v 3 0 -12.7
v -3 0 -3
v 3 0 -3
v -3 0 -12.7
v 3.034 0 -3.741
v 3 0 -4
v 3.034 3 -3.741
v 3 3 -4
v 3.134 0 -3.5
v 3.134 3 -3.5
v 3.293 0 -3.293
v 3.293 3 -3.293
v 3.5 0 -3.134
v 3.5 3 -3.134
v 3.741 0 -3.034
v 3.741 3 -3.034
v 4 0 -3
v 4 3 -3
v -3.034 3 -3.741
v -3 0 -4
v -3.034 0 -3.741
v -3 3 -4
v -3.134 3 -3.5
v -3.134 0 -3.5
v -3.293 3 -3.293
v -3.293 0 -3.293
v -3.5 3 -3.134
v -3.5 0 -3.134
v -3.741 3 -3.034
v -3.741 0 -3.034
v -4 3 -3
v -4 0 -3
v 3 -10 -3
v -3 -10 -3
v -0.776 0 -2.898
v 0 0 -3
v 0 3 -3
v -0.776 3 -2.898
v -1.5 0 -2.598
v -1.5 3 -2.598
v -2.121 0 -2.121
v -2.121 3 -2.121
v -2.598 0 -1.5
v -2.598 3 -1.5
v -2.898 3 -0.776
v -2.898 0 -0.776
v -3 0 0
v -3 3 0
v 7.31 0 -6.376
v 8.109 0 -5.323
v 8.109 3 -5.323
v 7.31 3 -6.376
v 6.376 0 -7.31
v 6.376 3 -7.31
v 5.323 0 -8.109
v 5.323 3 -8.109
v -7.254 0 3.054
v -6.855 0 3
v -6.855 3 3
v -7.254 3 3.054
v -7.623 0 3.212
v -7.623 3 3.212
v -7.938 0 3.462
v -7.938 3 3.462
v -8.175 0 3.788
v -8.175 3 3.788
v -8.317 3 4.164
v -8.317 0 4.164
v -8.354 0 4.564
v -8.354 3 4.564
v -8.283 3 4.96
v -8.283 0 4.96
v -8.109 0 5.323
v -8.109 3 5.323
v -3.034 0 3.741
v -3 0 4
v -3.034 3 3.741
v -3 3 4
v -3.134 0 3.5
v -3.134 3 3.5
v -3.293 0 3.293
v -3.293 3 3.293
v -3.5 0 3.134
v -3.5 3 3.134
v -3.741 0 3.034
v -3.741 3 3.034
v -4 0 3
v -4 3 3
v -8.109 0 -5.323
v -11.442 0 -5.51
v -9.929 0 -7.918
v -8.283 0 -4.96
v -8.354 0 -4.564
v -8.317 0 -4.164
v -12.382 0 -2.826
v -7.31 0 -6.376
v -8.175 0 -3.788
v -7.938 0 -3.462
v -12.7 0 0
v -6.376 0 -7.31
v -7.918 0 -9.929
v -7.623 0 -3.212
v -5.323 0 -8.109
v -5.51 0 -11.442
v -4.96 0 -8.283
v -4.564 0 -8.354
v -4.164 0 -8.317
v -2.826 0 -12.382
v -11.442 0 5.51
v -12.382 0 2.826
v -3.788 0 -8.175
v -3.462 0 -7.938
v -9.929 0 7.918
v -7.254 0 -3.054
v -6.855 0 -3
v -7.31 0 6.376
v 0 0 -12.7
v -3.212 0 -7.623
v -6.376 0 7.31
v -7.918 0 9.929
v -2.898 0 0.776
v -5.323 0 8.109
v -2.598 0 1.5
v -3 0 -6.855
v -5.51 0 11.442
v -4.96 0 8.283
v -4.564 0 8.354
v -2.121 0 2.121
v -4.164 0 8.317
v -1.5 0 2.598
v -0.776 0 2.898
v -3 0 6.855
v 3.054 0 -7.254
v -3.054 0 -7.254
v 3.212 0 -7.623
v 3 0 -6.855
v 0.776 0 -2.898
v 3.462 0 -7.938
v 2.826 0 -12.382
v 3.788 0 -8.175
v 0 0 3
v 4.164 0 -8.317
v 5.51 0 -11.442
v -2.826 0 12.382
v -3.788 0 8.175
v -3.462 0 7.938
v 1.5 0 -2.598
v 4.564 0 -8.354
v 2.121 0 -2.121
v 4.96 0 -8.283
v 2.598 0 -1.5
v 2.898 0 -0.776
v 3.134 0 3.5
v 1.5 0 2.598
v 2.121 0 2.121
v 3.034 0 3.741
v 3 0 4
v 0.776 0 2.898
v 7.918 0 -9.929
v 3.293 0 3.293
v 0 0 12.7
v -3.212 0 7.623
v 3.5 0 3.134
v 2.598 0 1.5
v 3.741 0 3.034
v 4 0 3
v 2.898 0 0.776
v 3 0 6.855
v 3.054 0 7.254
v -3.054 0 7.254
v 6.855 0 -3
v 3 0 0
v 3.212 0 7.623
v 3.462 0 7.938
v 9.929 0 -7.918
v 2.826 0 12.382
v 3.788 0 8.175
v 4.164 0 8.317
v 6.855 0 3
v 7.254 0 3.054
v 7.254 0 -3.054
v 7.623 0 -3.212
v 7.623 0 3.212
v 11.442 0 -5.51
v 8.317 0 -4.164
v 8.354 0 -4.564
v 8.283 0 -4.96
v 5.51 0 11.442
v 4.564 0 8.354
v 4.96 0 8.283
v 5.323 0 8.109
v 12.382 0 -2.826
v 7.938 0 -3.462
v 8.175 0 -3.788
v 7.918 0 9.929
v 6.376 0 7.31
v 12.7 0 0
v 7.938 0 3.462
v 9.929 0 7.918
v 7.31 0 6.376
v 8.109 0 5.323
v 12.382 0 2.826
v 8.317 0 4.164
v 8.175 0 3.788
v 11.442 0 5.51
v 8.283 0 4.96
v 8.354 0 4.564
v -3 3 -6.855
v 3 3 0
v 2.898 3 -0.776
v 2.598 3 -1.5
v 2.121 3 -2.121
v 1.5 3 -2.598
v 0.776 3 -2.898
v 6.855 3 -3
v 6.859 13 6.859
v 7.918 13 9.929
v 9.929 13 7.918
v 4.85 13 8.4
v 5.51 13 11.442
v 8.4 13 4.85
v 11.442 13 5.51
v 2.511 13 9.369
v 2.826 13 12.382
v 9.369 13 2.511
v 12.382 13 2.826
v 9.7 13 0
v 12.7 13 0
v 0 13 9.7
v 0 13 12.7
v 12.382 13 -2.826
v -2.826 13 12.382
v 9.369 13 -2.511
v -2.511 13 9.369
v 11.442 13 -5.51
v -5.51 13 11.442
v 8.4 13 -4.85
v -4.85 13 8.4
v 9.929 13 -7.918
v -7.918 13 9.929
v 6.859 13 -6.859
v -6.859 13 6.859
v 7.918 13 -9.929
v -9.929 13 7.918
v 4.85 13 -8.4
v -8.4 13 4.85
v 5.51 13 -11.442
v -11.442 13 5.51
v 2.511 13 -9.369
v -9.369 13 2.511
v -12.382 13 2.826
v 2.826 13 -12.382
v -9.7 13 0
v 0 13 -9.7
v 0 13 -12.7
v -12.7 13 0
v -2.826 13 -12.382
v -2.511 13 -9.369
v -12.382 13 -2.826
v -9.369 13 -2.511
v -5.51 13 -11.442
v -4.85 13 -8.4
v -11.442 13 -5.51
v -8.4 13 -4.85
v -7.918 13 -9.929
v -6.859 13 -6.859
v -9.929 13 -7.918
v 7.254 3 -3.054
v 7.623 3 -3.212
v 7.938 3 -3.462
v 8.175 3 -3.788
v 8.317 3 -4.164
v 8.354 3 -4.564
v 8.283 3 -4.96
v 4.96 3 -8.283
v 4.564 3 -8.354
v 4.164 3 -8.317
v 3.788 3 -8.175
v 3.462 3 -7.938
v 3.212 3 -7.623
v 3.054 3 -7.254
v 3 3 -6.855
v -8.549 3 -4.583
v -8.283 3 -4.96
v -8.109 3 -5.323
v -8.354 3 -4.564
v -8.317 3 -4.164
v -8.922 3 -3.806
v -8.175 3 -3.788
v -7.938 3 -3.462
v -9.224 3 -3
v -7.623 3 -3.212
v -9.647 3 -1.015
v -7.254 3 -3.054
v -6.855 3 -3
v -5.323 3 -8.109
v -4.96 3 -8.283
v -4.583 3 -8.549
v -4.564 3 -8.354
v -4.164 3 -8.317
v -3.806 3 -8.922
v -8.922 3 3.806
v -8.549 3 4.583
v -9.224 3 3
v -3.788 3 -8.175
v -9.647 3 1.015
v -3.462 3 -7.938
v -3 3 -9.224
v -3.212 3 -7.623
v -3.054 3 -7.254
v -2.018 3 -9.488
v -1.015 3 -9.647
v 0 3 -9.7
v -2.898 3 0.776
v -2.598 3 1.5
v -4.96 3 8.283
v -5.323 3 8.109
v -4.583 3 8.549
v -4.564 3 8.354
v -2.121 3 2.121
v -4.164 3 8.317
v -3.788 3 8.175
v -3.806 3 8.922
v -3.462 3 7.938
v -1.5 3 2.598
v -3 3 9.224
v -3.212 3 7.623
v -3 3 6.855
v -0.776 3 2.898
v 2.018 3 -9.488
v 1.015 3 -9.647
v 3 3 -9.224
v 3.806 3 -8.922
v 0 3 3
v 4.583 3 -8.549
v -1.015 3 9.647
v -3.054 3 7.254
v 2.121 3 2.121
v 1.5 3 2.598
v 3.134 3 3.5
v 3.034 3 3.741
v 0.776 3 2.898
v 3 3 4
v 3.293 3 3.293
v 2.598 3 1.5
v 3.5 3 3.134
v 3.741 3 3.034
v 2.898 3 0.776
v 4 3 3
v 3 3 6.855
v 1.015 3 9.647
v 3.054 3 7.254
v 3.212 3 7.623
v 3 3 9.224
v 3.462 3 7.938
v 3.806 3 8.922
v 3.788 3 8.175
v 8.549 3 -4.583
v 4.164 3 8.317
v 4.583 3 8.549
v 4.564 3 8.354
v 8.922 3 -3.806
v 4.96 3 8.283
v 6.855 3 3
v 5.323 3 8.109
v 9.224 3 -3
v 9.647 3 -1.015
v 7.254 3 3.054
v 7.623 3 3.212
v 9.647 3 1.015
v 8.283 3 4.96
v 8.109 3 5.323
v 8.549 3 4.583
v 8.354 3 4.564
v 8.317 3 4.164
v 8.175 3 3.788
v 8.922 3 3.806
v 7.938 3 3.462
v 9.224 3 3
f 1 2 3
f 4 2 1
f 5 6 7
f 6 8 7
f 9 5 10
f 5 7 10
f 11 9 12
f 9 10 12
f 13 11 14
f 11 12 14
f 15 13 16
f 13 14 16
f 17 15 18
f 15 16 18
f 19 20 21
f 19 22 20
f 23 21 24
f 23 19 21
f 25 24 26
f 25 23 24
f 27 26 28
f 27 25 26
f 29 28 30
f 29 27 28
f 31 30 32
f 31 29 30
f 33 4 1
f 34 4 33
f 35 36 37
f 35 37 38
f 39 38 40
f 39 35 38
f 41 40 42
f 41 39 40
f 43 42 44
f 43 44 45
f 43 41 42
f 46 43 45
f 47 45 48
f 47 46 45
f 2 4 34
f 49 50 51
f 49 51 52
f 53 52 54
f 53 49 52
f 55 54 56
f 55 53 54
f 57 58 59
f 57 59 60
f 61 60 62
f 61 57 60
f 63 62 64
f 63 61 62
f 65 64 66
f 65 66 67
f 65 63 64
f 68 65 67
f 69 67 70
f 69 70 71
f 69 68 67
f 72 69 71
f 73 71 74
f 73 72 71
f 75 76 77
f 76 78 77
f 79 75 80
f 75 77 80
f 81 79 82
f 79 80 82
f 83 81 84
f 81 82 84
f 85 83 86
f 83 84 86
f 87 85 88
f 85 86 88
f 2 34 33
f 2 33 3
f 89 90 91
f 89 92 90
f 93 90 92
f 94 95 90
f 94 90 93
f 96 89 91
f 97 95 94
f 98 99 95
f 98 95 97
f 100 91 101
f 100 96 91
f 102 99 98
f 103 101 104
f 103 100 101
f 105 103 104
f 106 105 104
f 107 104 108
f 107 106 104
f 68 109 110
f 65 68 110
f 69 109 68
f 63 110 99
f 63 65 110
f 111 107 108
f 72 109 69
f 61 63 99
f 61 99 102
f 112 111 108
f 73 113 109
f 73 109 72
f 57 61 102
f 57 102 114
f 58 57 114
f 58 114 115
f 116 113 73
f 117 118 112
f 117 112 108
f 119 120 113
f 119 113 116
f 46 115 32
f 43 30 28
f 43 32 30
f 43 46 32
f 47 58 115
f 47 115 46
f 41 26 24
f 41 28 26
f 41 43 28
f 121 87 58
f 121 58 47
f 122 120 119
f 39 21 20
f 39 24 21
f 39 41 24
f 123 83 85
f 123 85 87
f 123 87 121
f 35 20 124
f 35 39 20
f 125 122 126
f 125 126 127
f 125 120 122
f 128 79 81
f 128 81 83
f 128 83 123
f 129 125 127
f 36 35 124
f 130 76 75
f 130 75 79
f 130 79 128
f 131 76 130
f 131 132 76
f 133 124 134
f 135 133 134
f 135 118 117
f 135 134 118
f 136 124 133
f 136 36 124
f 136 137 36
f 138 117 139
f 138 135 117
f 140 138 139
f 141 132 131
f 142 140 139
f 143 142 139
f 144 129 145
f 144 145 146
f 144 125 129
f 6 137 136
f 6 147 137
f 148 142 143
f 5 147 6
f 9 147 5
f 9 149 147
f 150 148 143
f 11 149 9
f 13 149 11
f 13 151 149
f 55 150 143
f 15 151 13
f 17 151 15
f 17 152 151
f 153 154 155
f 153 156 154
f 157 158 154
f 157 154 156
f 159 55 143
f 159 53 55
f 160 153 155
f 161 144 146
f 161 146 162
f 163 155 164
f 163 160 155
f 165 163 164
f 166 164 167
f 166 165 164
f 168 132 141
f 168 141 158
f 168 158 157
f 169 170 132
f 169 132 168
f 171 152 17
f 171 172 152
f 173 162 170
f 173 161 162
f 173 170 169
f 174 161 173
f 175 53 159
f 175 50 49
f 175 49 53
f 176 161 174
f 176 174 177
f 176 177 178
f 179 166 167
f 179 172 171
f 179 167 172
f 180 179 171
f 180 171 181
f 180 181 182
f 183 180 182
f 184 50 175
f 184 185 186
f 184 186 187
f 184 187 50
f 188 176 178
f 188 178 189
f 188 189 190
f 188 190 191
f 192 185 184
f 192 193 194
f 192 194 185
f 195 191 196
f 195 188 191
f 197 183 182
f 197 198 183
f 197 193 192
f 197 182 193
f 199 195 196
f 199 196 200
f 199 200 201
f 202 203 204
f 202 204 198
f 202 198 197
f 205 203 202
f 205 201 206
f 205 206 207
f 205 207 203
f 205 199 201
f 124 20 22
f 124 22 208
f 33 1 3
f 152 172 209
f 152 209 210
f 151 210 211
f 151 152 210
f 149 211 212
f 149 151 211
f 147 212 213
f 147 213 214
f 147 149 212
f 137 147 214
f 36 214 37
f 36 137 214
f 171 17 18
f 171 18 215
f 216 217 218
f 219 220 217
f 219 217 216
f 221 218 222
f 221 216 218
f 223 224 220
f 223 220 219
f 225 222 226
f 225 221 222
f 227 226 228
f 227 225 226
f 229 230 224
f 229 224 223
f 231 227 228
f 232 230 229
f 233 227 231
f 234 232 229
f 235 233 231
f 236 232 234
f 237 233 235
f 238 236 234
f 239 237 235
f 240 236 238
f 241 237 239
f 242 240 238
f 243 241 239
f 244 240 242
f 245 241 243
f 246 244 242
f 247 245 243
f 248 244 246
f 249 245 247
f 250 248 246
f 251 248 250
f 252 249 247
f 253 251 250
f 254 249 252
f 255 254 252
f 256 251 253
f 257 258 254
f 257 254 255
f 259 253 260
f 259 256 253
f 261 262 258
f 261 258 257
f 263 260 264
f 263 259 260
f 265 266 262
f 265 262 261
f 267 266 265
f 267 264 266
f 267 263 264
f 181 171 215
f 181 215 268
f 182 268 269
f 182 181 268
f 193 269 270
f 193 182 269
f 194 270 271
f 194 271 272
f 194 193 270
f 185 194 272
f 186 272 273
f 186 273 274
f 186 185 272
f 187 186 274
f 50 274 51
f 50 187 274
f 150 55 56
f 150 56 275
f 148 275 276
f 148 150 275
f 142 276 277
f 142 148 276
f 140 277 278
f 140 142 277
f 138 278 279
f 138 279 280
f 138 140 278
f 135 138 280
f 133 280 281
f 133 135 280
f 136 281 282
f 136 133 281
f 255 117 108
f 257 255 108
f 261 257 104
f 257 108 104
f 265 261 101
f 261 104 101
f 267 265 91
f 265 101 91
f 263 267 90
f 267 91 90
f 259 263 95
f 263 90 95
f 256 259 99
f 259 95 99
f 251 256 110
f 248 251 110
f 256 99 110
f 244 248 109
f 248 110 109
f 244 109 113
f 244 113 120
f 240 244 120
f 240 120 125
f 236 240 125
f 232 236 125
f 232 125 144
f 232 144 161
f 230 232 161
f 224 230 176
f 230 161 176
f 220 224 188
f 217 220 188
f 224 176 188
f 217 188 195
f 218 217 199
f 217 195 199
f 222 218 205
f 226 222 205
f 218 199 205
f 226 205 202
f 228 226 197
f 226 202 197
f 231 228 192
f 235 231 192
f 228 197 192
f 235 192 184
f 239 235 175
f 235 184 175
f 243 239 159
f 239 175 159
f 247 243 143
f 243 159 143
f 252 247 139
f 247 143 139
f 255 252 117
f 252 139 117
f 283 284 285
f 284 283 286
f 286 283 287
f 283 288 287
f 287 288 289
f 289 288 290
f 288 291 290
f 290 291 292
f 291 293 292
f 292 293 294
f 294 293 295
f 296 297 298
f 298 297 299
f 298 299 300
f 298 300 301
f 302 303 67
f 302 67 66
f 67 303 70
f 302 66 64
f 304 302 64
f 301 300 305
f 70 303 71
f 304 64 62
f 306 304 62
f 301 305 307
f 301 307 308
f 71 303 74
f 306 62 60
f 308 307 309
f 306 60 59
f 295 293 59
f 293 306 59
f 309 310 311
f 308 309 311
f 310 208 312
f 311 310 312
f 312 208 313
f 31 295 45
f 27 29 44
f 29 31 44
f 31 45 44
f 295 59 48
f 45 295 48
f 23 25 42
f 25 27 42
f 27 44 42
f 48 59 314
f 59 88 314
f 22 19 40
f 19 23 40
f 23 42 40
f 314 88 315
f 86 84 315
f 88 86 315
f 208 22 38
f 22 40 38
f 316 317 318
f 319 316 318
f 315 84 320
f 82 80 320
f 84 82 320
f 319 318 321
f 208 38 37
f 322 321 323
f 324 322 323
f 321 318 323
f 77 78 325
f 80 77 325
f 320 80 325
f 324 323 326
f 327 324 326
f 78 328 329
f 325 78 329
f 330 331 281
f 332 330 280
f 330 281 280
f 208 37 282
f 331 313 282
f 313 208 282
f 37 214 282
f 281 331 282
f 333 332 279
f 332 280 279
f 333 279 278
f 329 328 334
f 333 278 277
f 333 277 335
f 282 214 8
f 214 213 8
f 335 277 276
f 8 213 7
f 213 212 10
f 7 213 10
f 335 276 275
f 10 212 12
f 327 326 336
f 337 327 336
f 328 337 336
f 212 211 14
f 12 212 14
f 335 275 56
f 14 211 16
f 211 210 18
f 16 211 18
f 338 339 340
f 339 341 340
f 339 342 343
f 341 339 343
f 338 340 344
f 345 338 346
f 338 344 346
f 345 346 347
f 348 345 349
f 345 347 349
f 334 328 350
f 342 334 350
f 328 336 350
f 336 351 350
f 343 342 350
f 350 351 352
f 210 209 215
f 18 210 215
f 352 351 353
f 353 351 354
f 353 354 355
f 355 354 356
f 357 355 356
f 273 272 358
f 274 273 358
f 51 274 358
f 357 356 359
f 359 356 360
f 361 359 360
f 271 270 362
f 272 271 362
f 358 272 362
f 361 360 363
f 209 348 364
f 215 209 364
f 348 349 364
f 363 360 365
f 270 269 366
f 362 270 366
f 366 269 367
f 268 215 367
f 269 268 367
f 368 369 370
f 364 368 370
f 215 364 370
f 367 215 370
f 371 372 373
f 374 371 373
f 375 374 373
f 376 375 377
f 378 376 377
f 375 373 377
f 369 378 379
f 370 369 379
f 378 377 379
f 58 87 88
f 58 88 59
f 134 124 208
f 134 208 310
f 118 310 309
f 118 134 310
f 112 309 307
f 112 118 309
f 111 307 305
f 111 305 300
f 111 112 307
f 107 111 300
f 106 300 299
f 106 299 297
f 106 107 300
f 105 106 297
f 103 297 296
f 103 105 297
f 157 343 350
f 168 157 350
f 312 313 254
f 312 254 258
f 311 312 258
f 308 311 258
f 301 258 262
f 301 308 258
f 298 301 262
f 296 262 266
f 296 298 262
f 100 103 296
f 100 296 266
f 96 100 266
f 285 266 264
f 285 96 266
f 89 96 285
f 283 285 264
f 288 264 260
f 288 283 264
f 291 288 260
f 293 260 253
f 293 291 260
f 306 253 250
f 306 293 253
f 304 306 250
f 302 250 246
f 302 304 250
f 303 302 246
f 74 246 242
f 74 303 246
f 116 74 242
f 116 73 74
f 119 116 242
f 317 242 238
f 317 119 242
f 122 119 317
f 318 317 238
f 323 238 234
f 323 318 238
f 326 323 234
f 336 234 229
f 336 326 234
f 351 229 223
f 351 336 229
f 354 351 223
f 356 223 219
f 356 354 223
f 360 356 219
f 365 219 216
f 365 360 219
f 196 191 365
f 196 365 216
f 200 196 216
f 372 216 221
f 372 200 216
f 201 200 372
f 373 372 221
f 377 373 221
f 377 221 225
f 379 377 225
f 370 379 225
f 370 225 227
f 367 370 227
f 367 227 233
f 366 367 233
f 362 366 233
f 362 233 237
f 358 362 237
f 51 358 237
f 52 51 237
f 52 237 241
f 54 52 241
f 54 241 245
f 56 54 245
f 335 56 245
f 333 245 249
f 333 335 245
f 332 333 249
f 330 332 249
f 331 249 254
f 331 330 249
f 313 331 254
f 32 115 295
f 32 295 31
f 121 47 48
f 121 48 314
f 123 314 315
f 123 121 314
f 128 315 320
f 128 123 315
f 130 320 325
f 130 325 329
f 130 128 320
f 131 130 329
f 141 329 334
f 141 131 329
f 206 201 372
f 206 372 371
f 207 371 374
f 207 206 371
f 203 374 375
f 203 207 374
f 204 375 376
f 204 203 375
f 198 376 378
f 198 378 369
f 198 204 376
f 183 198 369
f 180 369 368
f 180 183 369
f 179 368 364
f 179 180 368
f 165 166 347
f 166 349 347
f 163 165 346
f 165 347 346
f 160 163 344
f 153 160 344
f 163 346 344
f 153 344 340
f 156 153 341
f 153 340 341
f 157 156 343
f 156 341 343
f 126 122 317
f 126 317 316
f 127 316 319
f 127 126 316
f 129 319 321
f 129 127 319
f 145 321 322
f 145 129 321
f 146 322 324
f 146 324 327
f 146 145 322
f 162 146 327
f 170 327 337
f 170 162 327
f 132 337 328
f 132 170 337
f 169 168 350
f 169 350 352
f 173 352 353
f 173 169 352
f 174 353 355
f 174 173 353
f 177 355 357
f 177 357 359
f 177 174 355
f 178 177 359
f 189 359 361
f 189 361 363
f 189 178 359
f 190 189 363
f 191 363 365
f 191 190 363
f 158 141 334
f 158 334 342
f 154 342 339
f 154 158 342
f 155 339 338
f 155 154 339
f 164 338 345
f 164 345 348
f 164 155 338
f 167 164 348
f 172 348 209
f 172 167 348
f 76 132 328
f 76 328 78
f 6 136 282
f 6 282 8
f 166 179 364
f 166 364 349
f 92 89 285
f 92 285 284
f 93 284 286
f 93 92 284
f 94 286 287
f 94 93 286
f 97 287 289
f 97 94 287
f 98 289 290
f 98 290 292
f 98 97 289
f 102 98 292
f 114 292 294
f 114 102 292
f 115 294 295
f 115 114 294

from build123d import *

# Parameters (mm, degrees)
ESBO_O1_R                     = 12.7
ESBO_O1_R_2                   = 9.7
RESSALTO_EXTRUS_O1_DEPTH      = 13
RESSALTO_EXTRUS_O7_DEPTH      = 3
FILETE1_R                     = 1.5
FILETE2_R                     = 1
RESSALTO_EXTRUS_O8_DEPTH      = 3
RESSALTO_EXTRUS_O8_DEPTH_BACK = 3


with BuildPart() as part:
    # Esboço1 → Ressalto-extrusão1 (new body)
    with BuildSketch(Plane(origin=(0, 0, 0), x_dir=(1, 0, 0), z_dir=(0, 1, 0))):
        with Locations(Location((0, 0, 0), (0, 0, 90))):
            Circle(ESBO_O1_R)
        with Locations(Location((0, 0, 0), (0, 0, 90))):
            Circle(ESBO_O1_R_2, mode=Mode.SUBTRACT)
    extrude(amount=RESSALTO_EXTRUS_O1_DEPTH)

    # Esboço5 → Ressalto-extrusão7 (add)
    with BuildSketch(Plane.XZ):
        with BuildLine():
            ThreePointArc((-10.270832488, -3), (-7.566042559, -7.566042559), (-3, -10.270832488))
            Line((-3, -10.270832488), (-3, -9.224424101))
            ThreePointArc((-3, -9.224424101), (-6.858935778, -6.858935778), (-9.224424101, -3))
            Line((-9.224424101, -3), (-10.270832488, -3))
        make_face()
        with BuildLine():
            ThreePointArc((-3, -10.270832488), (0, -10.7), (3, -10.270832488))
            Line((3, -10.270832488), (3, -9.224424101))
            ThreePointArc((3, -9.224424101), (0, -9.7), (-3, -9.224424101))
            Line((-3, -9.224424101), (-3, -10.270832488))
        make_face()
        with BuildLine():
            ThreePointArc((3, 10.270832488), (0, 10.7), (-3, 10.270832488))
            Line((-3, 10.270832488), (-3, 9.224424101))
            ThreePointArc((-3, 9.224424101), (0, 9.7), (3, 9.224424101))
            Line((3, 9.224424101), (3, 10.270832488))
        make_face()
        with BuildLine():
            Line((3, -9.224424101), (3, -10.270832488))
            ThreePointArc((3, -10.270832488), (7.566042559, -7.566042559), (10.270832488, -3))
            Line((10.270832488, -3), (9.224424101, -3))
            ThreePointArc((9.224424101, -3), (6.858935778, -6.858935778), (3, -9.224424101))
        make_face()
        with BuildLine():
            Line((9.224424101, -3), (10.270832488, -3))
            ThreePointArc((10.270832488, -3), (10.592164737, -1.515270995), (10.7, 0))
            ThreePointArc((10.7, 0), (10.592164737, 1.515270995), (10.270832488, 3))
            Line((10.270832488, 3), (9.224424101, 3))
            ThreePointArc((9.224424101, 3), (9.580368307, 1.518730756), (9.7, 0))
            ThreePointArc((9.7, 0), (9.580368307, -1.518730756), (9.224424101, -3))
        make_face()
        with BuildLine():
            ThreePointArc((-10.270832488, 3), (-10.7, 0), (-10.270832488, -3))
            Line((-10.270832488, -3), (-9.224424101, -3))
            ThreePointArc((-9.224424101, -3), (-9.7, 0), (-9.224424101, 3))
            Line((-9.224424101, 3), (-10.270832488, 3))
        make_face()
        with BuildLine():
            Line((9.224424101, 3), (10.270832488, 3))
            ThreePointArc((10.270832488, 3), (7.566042559, 7.566042559), (3, 10.270832488))
            Line((3, 10.270832488), (3, 9.224424101))
            ThreePointArc((3, 9.224424101), (6.858935778, 6.858935778), (9.224424101, 3))
        make_face()
        with BuildLine():
            ThreePointArc((-3, 10.270832488), (-7.566042559, 7.566042559), (-10.270832488, 3))
            Line((-10.270832488, 3), (-9.224424101, 3))
            ThreePointArc((-9.224424101, 3), (-6.858935778, 6.858935778), (-3, 9.224424101))
            Line((-3, 9.224424101), (-3, 10.270832488))
        make_face()
        with BuildLine():
            Line((-9.224424101, -3), (-3, -3))
            Line((-3, -3), (-3, 0))
            Line((-3, 0), (-3, 3))
            Line((-3, 3), (-9.224424101, 3))
            ThreePointArc((-9.224424101, 3), (-9.7, 0), (-9.224424101, -3))
        make_face()
        with BuildLine():
            ThreePointArc((-3, -9.224424101), (0, -9.7), (3, -9.224424101))
            Line((3, -9.224424101), (3, -3))
            Line((3, -3), (0, -3))
            Line((0, -3), (-3, -3))
            Line((-3, -3), (-3, -9.224424101))
        make_face()
        with BuildLine():
            Line((3, 0), (3, -3))
            Line((3, -3), (9.224424101, -3))
            ThreePointArc((9.224424101, -3), (9.580368307, -1.518730756), (9.7, 0))
            ThreePointArc((9.7, 0), (9.580368307, 1.518730756), (9.224424101, 3))
            Line((9.224424101, 3), (3, 3))
            Line((3, 3), (3, 0))
        make_face()
        with BuildLine():
            Line((0, -3), (3, -3))
            Line((3, -3), (3, 0))
            ThreePointArc((3, 0), (2.121320344, -2.121320344), (0, -3))
        make_face()
        with BuildLine():
            Line((-3, -3), (0, -3))
            ThreePointArc((0, -3), (-2.121320344, -2.121320344), (-3, 0))
            Line((-3, 0), (-3, -3))
        make_face()
        with BuildLine():
            ThreePointArc((-3, 0), (-2.121320344, 2.121320344), (0, 3))
            Line((0, 3), (-3, 3))
            Line((-3, 3), (-3, 0))
        make_face()
        with BuildLine():
            ThreePointArc((0, 3), (2.121320344, 2.121320344), (3, 0))
            Line((3, 0), (3, 3))
            Line((3, 3), (0, 3))
        make_face()
        with BuildLine():
            Line((0, 3), (3, 3))
            Line((3, 3), (3, 9.224424101))
            ThreePointArc((3, 9.224424101), (0, 9.7), (-3, 9.224424101))
            Line((-3, 9.224424101), (-3, 3))
            Line((-3, 3), (0, 3))
        make_face()
    extrude(amount=-RESSALTO_EXTRUS_O7_DEPTH)

    # Filete1
    # the kernel refuses this fillet: 1.5 mm, written as the material it adds along each edge
    with BuildSketch(Plane(origin=(-9.224424101, 0, -3), x_dir=(0.4328657802637883, 0, -0.9014583829975857), z_dir=(0, 1, 0)), Plane(origin=(-3, 0, 9.224424101), x_dir=(-0.9014583829975888, 0, -0.43286578026378153), z_dir=(0, 1, 0)), Plane(origin=(3, 0, -9.224424101), x_dir=(0.9014583829975941, 0, 0.4328657802637706), z_dir=(0, 1, 0)), Plane(origin=(9.224424101, 0, 3), x_dir=(-0.43286578026378625, 0, 0.9014583829975866), z_dir=(0, 1, 0))) as filete1_piece_1:
        with BuildLine():
            CenterArc((2.377862549, -1.486705945), FILETE1_R, 82.366178215, 123.283389503)
            Line((1.025674975, -2.136004615), (0, 0))
            ThreePointArc((0, 0), (1.288562387, 0.085968225), (2.577124774, 0))
        make_face()
    extrude(amount=3)
    with BuildSketch(Plane(origin=(-3, 0, -9.224424101), x_dir=(-0.9014583829975884, 0, 0.43286578026378264), z_dir=(0, 1, 0)), Plane(origin=(-9.224424101, 0, 3), x_dir=(0.4328657802637885, 0, 0.9014583829975855), z_dir=(0, 1, 0)), Plane(origin=(9.224424101, 0, -3), x_dir=(-0.43286578026378775, 0, -0.9014583829975858), z_dir=(0, 1, 0)), Plane(origin=(3, 0, 9.224424101), x_dir=(0.9014583829975935, 0, -0.43286578026377187), z_dir=(0, 1, 0))) as filete1_piece_2:
        with BuildLine():
            CenterArc((2.377862549, 1.486705945), FILETE1_R, 154.350432282, 123.283389503)
            Line((1.025674975, 2.136004615), (0, 0))
            ThreePointArc((0, 0), (1.288562387, -0.085968225), (2.577124774, 0))
        make_face()
    extrude(amount=3)

    # Filete2
    filete2_edges = [part.edges().sort_by_distance(p)[0] for p in [
        (3, 1.5, -3),
        (3, 1.5, 3),
        (-3, 1.5, 3),
        (-3, 1.5, -3),
    ]]
    fillet(filete2_edges, radius=FILETE2_R)


with BuildPart() as body_2:
    # Esboço6 → Ressalto-extrusão8 (new, two sides: drawn at the far end of the back side and taken through both)
    with BuildSketch(Plane(origin=(0, 0, 0), x_dir=(0, 0, -1), z_dir=(1, 0, 0)).offset(-RESSALTO_EXTRUS_O8_DEPTH_BACK)):
        Polygon((3, 0), (12.7, 0), (3, -10), align=None)
    extrude(amount=RESSALTO_EXTRUS_O8_DEPTH + RESSALTO_EXTRUS_O8_DEPTH_BACK)


solid = Compound([part.part, body_2.part])
